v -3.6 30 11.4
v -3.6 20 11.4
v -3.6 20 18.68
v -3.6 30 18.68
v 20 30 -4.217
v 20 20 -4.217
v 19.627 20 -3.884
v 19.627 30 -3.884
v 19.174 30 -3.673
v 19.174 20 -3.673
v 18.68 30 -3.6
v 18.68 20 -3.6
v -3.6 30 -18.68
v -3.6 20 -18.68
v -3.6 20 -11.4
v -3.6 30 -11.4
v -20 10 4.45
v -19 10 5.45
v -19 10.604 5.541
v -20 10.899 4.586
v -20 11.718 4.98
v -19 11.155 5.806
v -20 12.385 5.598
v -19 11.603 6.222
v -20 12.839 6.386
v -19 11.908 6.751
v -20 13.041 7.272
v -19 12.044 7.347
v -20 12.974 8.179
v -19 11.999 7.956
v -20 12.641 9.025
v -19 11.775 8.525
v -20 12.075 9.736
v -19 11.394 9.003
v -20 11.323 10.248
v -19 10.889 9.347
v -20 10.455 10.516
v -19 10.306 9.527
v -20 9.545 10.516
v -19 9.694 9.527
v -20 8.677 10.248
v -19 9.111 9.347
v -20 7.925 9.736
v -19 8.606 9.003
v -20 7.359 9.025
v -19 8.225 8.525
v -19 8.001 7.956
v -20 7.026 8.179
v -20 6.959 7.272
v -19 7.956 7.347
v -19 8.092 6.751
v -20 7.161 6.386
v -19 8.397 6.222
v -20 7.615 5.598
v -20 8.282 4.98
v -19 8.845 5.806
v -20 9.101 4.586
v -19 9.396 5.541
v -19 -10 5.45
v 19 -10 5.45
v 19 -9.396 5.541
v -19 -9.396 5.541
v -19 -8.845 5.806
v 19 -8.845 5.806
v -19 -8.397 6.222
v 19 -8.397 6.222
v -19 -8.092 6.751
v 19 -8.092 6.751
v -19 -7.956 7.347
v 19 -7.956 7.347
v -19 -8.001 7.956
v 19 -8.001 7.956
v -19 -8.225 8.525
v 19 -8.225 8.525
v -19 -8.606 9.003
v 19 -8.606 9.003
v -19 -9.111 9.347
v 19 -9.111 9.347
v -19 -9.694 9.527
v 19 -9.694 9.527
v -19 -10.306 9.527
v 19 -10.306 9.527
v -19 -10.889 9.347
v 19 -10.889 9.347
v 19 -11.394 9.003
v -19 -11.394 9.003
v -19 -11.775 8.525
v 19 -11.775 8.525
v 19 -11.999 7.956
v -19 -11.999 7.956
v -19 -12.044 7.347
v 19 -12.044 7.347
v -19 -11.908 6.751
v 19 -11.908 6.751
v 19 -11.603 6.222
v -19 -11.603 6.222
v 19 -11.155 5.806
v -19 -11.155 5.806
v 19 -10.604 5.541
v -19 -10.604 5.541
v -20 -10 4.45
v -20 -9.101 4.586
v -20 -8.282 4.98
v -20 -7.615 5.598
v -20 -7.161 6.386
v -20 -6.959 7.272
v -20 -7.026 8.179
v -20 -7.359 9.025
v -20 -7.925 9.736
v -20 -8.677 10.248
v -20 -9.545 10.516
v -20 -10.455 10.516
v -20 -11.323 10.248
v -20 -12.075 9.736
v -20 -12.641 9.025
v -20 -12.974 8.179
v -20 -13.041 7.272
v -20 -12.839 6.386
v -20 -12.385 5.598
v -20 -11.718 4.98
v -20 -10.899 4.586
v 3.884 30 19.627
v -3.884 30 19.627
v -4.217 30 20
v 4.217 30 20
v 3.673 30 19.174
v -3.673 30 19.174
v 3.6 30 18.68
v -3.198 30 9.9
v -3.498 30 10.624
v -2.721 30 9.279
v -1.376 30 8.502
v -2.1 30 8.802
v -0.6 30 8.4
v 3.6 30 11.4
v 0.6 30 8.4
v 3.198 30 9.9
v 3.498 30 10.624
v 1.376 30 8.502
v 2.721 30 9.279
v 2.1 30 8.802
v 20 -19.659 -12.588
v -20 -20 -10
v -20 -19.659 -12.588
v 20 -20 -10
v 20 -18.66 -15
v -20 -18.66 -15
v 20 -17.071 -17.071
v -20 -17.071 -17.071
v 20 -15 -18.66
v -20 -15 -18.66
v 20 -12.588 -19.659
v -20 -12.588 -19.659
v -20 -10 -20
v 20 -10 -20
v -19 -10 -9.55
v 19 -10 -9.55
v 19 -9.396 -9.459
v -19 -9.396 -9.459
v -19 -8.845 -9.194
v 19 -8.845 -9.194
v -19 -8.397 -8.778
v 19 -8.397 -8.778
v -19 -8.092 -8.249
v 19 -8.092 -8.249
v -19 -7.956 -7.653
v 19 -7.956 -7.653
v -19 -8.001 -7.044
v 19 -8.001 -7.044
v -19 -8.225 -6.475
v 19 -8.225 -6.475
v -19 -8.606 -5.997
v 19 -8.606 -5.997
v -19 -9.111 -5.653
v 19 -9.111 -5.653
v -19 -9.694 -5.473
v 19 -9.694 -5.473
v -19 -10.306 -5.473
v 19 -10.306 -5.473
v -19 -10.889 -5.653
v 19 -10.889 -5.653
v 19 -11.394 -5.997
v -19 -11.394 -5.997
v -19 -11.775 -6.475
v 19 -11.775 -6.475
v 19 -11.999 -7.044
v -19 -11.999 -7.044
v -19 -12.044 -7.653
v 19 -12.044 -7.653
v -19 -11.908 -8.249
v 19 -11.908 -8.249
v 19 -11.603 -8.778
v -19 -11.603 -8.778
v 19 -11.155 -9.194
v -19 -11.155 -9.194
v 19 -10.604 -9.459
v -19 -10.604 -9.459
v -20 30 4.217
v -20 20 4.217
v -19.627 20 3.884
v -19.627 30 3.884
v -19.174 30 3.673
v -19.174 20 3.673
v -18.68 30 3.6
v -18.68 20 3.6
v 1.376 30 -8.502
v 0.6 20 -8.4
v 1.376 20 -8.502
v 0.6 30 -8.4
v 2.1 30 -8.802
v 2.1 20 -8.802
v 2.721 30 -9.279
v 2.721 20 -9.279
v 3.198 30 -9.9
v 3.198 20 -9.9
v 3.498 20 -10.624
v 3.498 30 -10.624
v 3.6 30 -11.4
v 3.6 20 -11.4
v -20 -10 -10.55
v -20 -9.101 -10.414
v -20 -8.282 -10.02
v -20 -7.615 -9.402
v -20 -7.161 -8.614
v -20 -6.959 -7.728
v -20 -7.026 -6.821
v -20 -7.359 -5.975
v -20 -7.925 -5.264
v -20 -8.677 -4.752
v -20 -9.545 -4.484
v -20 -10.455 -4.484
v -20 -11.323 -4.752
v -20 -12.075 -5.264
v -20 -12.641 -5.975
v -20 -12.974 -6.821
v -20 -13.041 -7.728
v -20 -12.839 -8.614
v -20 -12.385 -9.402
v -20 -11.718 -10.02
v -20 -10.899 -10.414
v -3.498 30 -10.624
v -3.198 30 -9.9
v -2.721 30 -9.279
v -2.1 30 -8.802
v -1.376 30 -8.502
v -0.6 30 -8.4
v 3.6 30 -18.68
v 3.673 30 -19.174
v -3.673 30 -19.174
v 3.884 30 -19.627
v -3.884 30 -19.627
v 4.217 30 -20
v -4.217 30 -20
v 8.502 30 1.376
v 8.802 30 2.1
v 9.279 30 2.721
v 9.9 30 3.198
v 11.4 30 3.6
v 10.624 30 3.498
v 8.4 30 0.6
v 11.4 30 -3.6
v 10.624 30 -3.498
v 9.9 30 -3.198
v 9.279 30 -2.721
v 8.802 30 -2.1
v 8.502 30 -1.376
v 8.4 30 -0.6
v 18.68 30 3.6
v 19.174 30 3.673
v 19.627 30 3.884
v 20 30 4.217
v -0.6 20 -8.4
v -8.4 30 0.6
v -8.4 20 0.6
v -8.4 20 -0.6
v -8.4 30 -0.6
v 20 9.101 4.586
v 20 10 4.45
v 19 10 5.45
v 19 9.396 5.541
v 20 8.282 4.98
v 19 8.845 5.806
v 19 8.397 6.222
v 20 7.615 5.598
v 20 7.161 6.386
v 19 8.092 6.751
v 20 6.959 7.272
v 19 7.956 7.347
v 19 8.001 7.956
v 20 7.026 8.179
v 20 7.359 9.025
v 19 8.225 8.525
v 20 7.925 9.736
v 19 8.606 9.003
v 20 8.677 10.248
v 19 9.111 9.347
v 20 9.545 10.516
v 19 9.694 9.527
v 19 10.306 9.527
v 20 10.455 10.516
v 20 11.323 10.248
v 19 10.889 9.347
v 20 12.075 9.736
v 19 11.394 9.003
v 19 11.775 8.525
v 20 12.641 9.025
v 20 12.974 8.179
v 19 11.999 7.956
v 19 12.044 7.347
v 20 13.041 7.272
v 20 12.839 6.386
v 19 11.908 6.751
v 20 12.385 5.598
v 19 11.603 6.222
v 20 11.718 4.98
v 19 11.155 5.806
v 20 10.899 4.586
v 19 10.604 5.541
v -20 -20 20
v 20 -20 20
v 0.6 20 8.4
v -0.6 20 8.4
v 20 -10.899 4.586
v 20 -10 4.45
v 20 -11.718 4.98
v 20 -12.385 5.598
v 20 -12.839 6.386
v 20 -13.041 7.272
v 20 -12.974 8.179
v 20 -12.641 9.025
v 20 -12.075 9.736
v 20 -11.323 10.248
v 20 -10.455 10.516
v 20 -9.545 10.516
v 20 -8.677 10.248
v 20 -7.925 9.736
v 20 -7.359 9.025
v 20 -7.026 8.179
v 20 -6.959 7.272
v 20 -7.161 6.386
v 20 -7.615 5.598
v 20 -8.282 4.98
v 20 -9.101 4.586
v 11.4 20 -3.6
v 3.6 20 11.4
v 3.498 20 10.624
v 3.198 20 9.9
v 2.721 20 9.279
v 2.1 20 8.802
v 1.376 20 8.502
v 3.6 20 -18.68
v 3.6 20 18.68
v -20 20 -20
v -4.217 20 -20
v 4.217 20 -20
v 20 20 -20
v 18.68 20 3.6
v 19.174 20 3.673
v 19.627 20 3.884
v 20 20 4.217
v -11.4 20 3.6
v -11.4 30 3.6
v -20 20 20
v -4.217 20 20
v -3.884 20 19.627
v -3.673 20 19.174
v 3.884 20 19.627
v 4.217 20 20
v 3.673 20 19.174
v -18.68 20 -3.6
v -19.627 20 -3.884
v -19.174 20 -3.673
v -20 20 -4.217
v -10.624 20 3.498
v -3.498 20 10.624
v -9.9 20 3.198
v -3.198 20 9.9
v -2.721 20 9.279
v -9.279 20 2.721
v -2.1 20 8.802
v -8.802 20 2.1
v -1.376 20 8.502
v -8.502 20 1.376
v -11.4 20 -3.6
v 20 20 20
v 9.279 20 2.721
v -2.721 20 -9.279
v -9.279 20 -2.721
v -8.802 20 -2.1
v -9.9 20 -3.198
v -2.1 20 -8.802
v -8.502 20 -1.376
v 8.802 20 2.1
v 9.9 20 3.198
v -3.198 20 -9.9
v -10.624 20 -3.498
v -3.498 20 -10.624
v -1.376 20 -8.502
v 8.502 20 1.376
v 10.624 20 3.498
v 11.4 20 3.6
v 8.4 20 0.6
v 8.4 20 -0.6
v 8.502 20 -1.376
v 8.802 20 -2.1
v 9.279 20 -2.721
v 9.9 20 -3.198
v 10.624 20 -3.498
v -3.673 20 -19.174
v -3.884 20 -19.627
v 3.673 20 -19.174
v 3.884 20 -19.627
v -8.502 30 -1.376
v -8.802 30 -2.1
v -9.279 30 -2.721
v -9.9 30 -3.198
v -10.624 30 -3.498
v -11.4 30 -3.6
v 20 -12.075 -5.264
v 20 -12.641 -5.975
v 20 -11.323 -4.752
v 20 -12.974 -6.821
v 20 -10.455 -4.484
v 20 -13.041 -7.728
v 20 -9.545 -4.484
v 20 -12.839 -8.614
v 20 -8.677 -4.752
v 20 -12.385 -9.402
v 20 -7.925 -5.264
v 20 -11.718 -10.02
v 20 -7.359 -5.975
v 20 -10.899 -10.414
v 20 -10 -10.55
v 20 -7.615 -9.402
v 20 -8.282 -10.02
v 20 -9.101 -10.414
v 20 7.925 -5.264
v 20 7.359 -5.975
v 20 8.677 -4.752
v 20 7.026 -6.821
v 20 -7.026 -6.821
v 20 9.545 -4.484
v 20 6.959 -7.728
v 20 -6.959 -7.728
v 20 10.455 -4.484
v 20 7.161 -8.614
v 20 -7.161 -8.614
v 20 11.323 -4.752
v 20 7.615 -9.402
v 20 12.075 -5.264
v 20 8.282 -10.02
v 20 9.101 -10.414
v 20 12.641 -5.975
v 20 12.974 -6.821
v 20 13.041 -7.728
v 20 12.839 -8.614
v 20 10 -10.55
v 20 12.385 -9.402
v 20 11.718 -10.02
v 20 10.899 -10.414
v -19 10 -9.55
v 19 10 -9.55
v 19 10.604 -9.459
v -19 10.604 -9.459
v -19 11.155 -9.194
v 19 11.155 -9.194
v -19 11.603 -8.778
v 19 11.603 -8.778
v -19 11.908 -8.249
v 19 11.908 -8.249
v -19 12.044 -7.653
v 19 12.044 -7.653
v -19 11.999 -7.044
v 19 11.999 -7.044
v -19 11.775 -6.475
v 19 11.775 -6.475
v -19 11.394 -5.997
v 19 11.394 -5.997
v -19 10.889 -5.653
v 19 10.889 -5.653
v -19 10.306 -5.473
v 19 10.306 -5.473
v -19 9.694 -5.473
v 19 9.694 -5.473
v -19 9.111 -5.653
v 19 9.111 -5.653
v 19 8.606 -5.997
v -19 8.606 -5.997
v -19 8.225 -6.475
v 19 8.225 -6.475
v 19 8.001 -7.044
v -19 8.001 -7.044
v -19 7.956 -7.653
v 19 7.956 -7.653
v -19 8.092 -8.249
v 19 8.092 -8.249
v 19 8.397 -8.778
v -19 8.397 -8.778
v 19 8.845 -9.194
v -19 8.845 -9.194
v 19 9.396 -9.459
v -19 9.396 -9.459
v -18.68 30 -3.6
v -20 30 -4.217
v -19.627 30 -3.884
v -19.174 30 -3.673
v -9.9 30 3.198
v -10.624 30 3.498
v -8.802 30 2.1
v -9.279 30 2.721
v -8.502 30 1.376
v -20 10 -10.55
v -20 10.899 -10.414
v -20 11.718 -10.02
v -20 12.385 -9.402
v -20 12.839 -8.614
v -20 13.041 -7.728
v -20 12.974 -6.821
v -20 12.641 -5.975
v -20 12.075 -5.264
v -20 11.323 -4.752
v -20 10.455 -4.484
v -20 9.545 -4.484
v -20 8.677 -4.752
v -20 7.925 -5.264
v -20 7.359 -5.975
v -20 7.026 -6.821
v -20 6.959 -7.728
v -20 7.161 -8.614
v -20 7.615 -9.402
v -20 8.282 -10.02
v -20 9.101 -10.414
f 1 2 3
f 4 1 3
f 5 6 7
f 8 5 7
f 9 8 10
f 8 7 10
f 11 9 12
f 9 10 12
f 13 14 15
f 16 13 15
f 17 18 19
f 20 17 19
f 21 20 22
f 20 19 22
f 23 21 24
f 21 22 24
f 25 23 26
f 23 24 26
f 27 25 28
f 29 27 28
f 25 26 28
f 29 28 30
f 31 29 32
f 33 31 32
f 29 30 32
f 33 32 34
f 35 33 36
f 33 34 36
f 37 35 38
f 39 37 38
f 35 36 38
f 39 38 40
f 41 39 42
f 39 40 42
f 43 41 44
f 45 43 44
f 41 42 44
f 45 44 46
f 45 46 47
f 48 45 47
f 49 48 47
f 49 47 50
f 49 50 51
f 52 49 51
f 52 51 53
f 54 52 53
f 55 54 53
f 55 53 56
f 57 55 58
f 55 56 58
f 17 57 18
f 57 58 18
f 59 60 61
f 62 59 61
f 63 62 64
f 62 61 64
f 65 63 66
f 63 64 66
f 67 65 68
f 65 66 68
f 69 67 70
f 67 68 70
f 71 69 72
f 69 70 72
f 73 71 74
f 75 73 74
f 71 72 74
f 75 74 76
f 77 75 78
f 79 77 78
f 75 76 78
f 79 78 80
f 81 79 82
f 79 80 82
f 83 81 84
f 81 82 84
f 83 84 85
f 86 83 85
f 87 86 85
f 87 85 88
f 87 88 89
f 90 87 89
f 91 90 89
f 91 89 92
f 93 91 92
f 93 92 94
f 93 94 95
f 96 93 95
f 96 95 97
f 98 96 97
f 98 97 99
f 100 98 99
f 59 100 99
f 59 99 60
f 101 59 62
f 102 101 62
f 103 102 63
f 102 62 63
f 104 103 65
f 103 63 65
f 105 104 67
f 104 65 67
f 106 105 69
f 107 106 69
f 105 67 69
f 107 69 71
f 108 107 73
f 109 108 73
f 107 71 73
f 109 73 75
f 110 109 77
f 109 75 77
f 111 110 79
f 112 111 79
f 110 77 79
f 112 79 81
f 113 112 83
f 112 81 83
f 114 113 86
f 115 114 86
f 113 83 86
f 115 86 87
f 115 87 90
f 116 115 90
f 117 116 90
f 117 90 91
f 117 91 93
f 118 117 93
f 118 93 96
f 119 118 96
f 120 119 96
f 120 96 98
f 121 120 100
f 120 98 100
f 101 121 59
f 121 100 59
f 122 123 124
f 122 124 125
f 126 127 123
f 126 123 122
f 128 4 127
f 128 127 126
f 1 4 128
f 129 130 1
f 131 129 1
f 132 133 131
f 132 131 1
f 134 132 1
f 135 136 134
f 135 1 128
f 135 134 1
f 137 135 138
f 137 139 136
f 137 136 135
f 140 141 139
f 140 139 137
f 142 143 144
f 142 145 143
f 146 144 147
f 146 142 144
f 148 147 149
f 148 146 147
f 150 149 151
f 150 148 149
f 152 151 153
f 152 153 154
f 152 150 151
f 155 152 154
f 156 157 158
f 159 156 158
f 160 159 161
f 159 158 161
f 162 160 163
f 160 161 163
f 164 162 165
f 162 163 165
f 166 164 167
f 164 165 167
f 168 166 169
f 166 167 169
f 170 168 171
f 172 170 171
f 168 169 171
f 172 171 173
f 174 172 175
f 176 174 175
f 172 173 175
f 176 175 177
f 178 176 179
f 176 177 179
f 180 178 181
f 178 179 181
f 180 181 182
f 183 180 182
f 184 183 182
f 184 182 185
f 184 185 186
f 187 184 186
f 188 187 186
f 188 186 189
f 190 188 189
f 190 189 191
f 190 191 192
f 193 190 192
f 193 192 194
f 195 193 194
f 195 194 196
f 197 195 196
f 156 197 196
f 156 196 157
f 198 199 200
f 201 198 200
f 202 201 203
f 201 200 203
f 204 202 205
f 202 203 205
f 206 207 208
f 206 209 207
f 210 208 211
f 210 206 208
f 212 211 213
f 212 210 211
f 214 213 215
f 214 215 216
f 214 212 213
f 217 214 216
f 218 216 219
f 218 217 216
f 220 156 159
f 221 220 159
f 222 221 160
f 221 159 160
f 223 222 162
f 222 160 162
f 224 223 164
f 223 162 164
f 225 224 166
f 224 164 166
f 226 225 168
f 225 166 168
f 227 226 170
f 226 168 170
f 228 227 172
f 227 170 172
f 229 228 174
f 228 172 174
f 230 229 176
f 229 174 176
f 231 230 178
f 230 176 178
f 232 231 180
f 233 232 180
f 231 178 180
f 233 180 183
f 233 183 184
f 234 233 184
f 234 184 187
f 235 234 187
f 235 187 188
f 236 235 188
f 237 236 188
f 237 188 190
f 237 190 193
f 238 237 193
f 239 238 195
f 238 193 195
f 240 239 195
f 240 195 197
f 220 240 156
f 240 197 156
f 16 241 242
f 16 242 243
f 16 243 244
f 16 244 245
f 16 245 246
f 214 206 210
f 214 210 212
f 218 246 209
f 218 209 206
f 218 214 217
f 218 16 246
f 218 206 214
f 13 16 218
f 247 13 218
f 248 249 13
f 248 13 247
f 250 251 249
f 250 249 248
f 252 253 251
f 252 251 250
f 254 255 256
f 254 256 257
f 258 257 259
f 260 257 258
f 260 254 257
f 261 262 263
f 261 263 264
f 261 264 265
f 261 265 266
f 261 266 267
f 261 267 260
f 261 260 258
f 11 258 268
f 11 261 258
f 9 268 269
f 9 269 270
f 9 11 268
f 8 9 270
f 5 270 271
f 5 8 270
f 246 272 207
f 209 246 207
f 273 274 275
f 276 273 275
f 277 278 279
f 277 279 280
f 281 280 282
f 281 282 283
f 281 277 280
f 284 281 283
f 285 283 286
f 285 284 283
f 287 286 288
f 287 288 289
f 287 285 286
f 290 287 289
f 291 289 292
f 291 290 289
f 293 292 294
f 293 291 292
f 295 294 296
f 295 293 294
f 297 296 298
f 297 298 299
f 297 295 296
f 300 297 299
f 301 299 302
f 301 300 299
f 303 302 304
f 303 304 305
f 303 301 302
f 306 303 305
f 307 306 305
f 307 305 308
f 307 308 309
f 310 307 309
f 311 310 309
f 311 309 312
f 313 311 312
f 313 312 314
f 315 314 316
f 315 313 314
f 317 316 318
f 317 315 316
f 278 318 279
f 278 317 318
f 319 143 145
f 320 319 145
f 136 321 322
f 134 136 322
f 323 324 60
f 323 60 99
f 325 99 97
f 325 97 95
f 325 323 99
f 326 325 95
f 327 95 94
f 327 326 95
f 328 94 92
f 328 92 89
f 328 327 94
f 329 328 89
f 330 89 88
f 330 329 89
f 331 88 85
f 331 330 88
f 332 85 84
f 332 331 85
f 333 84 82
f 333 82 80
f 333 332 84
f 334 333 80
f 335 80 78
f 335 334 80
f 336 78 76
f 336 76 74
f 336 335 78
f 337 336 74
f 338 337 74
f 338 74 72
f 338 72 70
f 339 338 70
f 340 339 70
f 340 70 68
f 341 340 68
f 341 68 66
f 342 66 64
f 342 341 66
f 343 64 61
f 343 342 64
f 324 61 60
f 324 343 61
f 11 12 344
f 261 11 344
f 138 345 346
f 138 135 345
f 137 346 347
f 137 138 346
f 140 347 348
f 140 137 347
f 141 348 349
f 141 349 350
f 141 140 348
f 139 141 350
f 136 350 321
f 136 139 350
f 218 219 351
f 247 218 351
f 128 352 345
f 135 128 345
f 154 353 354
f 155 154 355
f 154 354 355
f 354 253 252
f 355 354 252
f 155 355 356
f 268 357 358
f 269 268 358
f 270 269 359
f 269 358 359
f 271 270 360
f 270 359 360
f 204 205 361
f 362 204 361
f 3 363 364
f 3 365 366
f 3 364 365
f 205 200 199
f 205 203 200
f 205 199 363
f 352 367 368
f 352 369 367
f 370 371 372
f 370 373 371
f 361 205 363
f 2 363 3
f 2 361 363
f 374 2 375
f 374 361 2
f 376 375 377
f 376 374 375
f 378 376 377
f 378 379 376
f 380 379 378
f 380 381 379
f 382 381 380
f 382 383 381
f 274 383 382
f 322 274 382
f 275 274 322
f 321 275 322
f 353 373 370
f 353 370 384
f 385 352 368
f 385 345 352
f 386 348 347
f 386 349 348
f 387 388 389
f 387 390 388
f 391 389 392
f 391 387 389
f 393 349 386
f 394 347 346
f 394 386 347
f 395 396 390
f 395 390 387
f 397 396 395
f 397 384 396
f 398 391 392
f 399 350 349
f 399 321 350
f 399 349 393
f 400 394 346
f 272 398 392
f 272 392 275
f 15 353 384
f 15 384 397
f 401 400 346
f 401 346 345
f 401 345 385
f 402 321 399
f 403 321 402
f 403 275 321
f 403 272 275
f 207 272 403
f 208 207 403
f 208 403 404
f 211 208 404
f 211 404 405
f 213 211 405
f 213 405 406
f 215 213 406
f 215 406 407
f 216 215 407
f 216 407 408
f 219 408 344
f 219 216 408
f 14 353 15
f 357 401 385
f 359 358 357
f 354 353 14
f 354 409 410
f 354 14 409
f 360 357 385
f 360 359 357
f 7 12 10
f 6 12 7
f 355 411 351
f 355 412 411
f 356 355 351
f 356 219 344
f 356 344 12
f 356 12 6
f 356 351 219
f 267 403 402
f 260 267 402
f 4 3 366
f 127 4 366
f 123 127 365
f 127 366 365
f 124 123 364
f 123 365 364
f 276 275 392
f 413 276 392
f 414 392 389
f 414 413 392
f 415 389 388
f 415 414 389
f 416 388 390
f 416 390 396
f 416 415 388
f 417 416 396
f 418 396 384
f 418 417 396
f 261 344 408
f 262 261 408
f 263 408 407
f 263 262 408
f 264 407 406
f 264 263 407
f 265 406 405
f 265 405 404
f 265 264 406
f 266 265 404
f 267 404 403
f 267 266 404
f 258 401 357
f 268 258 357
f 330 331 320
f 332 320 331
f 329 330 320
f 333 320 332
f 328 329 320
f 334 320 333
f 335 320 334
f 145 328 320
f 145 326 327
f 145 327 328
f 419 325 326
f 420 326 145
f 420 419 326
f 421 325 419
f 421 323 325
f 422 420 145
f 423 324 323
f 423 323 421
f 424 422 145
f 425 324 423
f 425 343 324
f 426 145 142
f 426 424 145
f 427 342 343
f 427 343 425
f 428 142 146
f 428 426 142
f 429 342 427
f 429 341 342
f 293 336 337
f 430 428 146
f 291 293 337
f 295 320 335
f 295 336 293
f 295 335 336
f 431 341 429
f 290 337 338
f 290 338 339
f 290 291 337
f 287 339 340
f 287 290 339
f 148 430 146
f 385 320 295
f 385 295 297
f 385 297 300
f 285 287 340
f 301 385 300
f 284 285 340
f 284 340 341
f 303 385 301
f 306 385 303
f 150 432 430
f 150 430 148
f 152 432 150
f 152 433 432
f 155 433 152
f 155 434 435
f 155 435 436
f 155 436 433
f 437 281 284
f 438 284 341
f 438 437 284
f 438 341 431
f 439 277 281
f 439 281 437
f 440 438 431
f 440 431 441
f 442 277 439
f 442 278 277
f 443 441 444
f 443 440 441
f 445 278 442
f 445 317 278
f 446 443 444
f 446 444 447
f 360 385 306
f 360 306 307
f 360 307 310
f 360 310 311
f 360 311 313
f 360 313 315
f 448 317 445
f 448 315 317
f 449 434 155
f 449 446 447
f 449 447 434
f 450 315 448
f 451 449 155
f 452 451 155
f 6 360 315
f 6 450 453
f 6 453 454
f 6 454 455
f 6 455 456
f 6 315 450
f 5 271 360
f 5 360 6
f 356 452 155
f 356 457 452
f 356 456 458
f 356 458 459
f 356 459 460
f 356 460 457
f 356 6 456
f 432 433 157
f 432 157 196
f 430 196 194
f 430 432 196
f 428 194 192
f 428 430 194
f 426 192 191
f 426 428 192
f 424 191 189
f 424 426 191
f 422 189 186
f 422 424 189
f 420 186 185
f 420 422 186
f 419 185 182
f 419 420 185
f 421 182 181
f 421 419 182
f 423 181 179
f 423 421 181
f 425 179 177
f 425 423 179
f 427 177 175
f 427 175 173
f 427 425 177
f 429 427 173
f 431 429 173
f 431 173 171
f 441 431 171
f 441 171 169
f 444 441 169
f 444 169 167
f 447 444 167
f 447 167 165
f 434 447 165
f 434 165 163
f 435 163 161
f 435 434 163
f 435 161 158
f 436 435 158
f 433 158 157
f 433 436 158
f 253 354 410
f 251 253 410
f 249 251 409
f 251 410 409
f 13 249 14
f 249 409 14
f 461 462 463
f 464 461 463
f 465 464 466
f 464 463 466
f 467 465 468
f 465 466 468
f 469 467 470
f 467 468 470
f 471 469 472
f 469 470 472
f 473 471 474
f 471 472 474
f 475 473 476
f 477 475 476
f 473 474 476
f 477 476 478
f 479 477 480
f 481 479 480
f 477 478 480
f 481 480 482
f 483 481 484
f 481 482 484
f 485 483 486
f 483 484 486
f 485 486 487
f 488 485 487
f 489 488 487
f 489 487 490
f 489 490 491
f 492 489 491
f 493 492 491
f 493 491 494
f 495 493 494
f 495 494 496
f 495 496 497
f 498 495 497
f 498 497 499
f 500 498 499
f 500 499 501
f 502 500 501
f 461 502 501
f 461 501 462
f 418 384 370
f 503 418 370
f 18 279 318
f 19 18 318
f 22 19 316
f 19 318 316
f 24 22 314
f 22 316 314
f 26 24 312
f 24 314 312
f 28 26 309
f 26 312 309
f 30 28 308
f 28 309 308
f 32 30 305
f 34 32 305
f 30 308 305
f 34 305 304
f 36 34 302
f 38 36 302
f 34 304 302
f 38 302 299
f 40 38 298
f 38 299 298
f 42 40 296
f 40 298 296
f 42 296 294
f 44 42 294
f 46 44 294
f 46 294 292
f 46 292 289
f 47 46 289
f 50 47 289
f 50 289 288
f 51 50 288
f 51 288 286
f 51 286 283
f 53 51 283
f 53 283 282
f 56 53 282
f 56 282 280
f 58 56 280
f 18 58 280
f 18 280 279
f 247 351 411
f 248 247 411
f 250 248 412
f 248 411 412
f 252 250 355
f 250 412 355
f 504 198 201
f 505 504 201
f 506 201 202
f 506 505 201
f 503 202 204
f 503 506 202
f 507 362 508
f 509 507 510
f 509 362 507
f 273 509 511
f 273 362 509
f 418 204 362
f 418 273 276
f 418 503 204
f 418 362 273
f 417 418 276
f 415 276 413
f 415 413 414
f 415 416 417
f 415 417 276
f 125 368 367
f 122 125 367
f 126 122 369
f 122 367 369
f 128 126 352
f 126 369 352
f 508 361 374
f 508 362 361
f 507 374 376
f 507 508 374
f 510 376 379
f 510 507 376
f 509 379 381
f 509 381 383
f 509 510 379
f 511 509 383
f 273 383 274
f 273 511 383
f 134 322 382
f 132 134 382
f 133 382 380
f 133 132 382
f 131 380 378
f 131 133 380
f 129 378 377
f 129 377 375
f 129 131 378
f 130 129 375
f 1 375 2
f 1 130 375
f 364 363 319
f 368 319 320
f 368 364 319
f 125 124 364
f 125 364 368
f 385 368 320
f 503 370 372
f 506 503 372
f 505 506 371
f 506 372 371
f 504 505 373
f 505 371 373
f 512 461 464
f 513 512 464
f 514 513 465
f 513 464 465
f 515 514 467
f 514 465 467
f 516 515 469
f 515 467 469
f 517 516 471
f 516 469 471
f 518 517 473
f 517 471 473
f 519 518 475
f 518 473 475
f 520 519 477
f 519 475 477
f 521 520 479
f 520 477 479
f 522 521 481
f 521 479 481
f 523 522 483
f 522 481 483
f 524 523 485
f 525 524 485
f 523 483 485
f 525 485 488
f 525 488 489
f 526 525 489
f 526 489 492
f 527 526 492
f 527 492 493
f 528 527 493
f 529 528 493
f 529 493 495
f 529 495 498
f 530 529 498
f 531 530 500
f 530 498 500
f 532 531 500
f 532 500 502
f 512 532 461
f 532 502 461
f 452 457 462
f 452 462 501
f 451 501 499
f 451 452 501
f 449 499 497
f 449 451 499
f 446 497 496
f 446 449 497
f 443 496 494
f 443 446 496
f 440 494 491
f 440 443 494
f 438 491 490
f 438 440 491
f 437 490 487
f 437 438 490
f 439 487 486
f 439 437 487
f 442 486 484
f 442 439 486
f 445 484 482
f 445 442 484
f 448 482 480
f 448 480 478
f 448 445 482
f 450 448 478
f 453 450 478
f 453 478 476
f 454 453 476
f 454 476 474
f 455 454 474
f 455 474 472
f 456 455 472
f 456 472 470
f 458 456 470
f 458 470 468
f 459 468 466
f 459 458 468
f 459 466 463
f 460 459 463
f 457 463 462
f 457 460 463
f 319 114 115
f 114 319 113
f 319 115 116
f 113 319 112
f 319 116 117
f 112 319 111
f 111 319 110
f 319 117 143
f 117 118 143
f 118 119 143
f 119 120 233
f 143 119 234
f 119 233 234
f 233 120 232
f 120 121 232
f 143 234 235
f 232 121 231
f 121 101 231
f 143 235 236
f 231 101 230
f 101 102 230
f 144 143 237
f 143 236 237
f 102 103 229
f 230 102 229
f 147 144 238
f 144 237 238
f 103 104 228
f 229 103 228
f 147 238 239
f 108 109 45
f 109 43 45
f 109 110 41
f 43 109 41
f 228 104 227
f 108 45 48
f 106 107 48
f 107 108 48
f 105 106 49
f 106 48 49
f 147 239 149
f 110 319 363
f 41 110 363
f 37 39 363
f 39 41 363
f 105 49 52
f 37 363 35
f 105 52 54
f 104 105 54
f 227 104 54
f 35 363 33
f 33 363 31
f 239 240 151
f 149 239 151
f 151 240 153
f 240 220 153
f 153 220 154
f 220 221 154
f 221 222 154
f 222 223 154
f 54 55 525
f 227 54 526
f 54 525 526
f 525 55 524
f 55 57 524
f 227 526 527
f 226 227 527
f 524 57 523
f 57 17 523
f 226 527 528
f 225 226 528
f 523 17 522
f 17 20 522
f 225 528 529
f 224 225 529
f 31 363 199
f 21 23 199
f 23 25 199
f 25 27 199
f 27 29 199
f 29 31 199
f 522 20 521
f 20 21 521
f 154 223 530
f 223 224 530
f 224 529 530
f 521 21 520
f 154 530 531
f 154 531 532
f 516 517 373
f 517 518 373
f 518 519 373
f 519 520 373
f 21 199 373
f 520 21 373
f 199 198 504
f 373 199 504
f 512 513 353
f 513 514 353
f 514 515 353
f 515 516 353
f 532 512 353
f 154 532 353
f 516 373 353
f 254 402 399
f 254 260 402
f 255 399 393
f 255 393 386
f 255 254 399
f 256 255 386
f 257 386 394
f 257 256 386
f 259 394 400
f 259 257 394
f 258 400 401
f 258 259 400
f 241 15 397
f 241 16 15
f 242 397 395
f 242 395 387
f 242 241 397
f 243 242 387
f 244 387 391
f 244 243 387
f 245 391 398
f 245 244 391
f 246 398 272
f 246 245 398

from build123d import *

# Parameters (mm, degrees)
SKETCH1_W           = 40
SKETCH1_H           = 40
BOSS_EXTRUDE1_DEPTH = 20
CUT_EXTRUDE1_START  = 13
SKETCH2_R           = 2.05
CUT_EXTRUDE1_DEPTH  = 34
BOSS_EXTRUDE2_DEPTH = 10
FILLET1_R           = 10
CHAMFER1_SIZE       = 1
FILLET2_R           = 3


with BuildPart() as part:
    # Sketch1 → Boss-Extrude1 (new body, symmetric)
    with BuildSketch(Plane(origin=(0, 0, 0), x_dir=(1, 0, 0), z_dir=(0, 1, 0))):
        Rectangle(SKETCH1_W, SKETCH1_H)
    extrude(amount=BOSS_EXTRUDE1_DEPTH, both=True)

    # Sketch2 → Cut-Extrude1 (cut, through all)
    with BuildSketch(Plane(origin=(0, 0, 0), x_dir=(0, 0, -1), z_dir=(1, 0, 0)).offset(CUT_EXTRUDE1_START)):
        with Locations((-7.5, 10)):
            Circle(SKETCH2_R)
        with Locations((7.5, 10)):
            Circle(SKETCH2_R)
        with Locations((-7.5, -10)):
            Circle(SKETCH2_R)
        with Locations((7.5, -10)):
            Circle(SKETCH2_R)
    cut_extrude1 = extrude(amount=-CUT_EXTRUDE1_DEPTH, mode=Mode.SUBTRACT)

    # Mirror1: Cut-Extrude1 across plane
    add(cut_extrude1.mirror(Plane(origin=(0, 0, 0), x_dir=(0, 0, 1), z_dir=(1, 0, 0))), mode=Mode.SUBTRACT)

    # Sketch3 → Boss-Extrude2 (add)
    with BuildSketch(Plane(origin=(0, 20, 0), x_dir=(1, 0, 0), z_dir=(0, 1, 0))):
        with BuildLine():
            Line((18.68, 3.6), (8.4, 3.6))
            Line((8.4, 3.6), (8.4, -3.6))
            Line((8.4, -3.6), (18.68, -3.6))
            ThreePointArc((18.68, -3.6), (19.408599647, -3.761942699), (20, -4.2172761))
            Line((20, -4.2172761), (20, 4.2172761))
            ThreePointArc((20, 4.2172761), (19.408599647, 3.761942699), (18.68, 3.6))
        make_face()
        with BuildLine():
            ThreePointArc((3.6, 18.68), (3.761942699, 19.408599647), (4.2172761, 20))
            Line((4.2172761, 20), (-4.2172761, 20))
            ThreePointArc((-4.2172761, 20), (-3.761942699, 19.408599647), (-3.6, 18.68))
            Line((-3.6, 18.68), (-3.6, 8.4))
            Line((-3.6, 8.4), (3.6, 8.4))
            Line((3.6, 8.4), (3.6, 18.68))
        make_face()
        with BuildLine():
            Line((-4.2172761, -20), (4.2172761, -20))
            ThreePointArc((4.2172761, -20), (3.761942699, -19.408599647), (3.6, -18.68))
            Line((3.6, -18.68), (3.6, -8.4))
            Line((3.6, -8.4), (-3.6, -8.4))
            Line((-3.6, -8.4), (-3.6, -18.68))
            ThreePointArc((-3.6, -18.68), (-3.761942699, -19.408599647), (-4.2172761, -20))
        make_face()
        with BuildLine():
            ThreePointArc((-18.68, 3.6), (-19.408599647, 3.761942699), (-20, 4.2172761))
            Line((-20, 4.2172761), (-20, -4.2172761))
            ThreePointArc((-20, -4.2172761), (-19.408599647, -3.761942699), (-18.68, -3.6))
            Line((-18.68, -3.6), (-8.4, -3.6))
            Line((-8.4, -3.6), (-8.4, 3.6))
            Line((-8.4, 3.6), (-18.68, 3.6))
        make_face()
    extrude(amount=BOSS_EXTRUDE2_DEPTH)

    # Fillet1
    fillet1_edges = [part.edges().sort_by_distance(p)[0] for p in [
        (0, -20, -20),
    ]]
    fillet(fillet1_edges, radius=FILLET1_R)

    # Chamfer1
    chamfer1_edges = [part.edges().sort_by_distance(p)[0] for p in [
        (-20, 10, -5.45),
        (-20, -10, 9.55),
        (-20, -10, -5.45),
        (-20, 10, 9.55),
        (20, 10, -5.45),
        (20, -10, 9.55),
        (20, -10, -5.45),
        (20, 10, 9.55),
    ]]
    chamfer(chamfer1_edges, length=CHAMFER1_SIZE)

    # Fillet2
    fillet2_edges = [part.edges().sort_by_distance(p)[0] for p in [
        (8.4, 25, -3.6),
        (8.4, 25, 3.6),
        (-8.4, 25, 3.6),
        (-8.4, 25, -3.6),
        (-3.6, 25, -8.4),
        (3.6, 25, -8.4),
        (3.6, 25, 8.4),
        (-3.6, 25, 8.4),
    ]]
    fillet(fillet2_edges, radius=FILLET2_R)


solid = part.part
